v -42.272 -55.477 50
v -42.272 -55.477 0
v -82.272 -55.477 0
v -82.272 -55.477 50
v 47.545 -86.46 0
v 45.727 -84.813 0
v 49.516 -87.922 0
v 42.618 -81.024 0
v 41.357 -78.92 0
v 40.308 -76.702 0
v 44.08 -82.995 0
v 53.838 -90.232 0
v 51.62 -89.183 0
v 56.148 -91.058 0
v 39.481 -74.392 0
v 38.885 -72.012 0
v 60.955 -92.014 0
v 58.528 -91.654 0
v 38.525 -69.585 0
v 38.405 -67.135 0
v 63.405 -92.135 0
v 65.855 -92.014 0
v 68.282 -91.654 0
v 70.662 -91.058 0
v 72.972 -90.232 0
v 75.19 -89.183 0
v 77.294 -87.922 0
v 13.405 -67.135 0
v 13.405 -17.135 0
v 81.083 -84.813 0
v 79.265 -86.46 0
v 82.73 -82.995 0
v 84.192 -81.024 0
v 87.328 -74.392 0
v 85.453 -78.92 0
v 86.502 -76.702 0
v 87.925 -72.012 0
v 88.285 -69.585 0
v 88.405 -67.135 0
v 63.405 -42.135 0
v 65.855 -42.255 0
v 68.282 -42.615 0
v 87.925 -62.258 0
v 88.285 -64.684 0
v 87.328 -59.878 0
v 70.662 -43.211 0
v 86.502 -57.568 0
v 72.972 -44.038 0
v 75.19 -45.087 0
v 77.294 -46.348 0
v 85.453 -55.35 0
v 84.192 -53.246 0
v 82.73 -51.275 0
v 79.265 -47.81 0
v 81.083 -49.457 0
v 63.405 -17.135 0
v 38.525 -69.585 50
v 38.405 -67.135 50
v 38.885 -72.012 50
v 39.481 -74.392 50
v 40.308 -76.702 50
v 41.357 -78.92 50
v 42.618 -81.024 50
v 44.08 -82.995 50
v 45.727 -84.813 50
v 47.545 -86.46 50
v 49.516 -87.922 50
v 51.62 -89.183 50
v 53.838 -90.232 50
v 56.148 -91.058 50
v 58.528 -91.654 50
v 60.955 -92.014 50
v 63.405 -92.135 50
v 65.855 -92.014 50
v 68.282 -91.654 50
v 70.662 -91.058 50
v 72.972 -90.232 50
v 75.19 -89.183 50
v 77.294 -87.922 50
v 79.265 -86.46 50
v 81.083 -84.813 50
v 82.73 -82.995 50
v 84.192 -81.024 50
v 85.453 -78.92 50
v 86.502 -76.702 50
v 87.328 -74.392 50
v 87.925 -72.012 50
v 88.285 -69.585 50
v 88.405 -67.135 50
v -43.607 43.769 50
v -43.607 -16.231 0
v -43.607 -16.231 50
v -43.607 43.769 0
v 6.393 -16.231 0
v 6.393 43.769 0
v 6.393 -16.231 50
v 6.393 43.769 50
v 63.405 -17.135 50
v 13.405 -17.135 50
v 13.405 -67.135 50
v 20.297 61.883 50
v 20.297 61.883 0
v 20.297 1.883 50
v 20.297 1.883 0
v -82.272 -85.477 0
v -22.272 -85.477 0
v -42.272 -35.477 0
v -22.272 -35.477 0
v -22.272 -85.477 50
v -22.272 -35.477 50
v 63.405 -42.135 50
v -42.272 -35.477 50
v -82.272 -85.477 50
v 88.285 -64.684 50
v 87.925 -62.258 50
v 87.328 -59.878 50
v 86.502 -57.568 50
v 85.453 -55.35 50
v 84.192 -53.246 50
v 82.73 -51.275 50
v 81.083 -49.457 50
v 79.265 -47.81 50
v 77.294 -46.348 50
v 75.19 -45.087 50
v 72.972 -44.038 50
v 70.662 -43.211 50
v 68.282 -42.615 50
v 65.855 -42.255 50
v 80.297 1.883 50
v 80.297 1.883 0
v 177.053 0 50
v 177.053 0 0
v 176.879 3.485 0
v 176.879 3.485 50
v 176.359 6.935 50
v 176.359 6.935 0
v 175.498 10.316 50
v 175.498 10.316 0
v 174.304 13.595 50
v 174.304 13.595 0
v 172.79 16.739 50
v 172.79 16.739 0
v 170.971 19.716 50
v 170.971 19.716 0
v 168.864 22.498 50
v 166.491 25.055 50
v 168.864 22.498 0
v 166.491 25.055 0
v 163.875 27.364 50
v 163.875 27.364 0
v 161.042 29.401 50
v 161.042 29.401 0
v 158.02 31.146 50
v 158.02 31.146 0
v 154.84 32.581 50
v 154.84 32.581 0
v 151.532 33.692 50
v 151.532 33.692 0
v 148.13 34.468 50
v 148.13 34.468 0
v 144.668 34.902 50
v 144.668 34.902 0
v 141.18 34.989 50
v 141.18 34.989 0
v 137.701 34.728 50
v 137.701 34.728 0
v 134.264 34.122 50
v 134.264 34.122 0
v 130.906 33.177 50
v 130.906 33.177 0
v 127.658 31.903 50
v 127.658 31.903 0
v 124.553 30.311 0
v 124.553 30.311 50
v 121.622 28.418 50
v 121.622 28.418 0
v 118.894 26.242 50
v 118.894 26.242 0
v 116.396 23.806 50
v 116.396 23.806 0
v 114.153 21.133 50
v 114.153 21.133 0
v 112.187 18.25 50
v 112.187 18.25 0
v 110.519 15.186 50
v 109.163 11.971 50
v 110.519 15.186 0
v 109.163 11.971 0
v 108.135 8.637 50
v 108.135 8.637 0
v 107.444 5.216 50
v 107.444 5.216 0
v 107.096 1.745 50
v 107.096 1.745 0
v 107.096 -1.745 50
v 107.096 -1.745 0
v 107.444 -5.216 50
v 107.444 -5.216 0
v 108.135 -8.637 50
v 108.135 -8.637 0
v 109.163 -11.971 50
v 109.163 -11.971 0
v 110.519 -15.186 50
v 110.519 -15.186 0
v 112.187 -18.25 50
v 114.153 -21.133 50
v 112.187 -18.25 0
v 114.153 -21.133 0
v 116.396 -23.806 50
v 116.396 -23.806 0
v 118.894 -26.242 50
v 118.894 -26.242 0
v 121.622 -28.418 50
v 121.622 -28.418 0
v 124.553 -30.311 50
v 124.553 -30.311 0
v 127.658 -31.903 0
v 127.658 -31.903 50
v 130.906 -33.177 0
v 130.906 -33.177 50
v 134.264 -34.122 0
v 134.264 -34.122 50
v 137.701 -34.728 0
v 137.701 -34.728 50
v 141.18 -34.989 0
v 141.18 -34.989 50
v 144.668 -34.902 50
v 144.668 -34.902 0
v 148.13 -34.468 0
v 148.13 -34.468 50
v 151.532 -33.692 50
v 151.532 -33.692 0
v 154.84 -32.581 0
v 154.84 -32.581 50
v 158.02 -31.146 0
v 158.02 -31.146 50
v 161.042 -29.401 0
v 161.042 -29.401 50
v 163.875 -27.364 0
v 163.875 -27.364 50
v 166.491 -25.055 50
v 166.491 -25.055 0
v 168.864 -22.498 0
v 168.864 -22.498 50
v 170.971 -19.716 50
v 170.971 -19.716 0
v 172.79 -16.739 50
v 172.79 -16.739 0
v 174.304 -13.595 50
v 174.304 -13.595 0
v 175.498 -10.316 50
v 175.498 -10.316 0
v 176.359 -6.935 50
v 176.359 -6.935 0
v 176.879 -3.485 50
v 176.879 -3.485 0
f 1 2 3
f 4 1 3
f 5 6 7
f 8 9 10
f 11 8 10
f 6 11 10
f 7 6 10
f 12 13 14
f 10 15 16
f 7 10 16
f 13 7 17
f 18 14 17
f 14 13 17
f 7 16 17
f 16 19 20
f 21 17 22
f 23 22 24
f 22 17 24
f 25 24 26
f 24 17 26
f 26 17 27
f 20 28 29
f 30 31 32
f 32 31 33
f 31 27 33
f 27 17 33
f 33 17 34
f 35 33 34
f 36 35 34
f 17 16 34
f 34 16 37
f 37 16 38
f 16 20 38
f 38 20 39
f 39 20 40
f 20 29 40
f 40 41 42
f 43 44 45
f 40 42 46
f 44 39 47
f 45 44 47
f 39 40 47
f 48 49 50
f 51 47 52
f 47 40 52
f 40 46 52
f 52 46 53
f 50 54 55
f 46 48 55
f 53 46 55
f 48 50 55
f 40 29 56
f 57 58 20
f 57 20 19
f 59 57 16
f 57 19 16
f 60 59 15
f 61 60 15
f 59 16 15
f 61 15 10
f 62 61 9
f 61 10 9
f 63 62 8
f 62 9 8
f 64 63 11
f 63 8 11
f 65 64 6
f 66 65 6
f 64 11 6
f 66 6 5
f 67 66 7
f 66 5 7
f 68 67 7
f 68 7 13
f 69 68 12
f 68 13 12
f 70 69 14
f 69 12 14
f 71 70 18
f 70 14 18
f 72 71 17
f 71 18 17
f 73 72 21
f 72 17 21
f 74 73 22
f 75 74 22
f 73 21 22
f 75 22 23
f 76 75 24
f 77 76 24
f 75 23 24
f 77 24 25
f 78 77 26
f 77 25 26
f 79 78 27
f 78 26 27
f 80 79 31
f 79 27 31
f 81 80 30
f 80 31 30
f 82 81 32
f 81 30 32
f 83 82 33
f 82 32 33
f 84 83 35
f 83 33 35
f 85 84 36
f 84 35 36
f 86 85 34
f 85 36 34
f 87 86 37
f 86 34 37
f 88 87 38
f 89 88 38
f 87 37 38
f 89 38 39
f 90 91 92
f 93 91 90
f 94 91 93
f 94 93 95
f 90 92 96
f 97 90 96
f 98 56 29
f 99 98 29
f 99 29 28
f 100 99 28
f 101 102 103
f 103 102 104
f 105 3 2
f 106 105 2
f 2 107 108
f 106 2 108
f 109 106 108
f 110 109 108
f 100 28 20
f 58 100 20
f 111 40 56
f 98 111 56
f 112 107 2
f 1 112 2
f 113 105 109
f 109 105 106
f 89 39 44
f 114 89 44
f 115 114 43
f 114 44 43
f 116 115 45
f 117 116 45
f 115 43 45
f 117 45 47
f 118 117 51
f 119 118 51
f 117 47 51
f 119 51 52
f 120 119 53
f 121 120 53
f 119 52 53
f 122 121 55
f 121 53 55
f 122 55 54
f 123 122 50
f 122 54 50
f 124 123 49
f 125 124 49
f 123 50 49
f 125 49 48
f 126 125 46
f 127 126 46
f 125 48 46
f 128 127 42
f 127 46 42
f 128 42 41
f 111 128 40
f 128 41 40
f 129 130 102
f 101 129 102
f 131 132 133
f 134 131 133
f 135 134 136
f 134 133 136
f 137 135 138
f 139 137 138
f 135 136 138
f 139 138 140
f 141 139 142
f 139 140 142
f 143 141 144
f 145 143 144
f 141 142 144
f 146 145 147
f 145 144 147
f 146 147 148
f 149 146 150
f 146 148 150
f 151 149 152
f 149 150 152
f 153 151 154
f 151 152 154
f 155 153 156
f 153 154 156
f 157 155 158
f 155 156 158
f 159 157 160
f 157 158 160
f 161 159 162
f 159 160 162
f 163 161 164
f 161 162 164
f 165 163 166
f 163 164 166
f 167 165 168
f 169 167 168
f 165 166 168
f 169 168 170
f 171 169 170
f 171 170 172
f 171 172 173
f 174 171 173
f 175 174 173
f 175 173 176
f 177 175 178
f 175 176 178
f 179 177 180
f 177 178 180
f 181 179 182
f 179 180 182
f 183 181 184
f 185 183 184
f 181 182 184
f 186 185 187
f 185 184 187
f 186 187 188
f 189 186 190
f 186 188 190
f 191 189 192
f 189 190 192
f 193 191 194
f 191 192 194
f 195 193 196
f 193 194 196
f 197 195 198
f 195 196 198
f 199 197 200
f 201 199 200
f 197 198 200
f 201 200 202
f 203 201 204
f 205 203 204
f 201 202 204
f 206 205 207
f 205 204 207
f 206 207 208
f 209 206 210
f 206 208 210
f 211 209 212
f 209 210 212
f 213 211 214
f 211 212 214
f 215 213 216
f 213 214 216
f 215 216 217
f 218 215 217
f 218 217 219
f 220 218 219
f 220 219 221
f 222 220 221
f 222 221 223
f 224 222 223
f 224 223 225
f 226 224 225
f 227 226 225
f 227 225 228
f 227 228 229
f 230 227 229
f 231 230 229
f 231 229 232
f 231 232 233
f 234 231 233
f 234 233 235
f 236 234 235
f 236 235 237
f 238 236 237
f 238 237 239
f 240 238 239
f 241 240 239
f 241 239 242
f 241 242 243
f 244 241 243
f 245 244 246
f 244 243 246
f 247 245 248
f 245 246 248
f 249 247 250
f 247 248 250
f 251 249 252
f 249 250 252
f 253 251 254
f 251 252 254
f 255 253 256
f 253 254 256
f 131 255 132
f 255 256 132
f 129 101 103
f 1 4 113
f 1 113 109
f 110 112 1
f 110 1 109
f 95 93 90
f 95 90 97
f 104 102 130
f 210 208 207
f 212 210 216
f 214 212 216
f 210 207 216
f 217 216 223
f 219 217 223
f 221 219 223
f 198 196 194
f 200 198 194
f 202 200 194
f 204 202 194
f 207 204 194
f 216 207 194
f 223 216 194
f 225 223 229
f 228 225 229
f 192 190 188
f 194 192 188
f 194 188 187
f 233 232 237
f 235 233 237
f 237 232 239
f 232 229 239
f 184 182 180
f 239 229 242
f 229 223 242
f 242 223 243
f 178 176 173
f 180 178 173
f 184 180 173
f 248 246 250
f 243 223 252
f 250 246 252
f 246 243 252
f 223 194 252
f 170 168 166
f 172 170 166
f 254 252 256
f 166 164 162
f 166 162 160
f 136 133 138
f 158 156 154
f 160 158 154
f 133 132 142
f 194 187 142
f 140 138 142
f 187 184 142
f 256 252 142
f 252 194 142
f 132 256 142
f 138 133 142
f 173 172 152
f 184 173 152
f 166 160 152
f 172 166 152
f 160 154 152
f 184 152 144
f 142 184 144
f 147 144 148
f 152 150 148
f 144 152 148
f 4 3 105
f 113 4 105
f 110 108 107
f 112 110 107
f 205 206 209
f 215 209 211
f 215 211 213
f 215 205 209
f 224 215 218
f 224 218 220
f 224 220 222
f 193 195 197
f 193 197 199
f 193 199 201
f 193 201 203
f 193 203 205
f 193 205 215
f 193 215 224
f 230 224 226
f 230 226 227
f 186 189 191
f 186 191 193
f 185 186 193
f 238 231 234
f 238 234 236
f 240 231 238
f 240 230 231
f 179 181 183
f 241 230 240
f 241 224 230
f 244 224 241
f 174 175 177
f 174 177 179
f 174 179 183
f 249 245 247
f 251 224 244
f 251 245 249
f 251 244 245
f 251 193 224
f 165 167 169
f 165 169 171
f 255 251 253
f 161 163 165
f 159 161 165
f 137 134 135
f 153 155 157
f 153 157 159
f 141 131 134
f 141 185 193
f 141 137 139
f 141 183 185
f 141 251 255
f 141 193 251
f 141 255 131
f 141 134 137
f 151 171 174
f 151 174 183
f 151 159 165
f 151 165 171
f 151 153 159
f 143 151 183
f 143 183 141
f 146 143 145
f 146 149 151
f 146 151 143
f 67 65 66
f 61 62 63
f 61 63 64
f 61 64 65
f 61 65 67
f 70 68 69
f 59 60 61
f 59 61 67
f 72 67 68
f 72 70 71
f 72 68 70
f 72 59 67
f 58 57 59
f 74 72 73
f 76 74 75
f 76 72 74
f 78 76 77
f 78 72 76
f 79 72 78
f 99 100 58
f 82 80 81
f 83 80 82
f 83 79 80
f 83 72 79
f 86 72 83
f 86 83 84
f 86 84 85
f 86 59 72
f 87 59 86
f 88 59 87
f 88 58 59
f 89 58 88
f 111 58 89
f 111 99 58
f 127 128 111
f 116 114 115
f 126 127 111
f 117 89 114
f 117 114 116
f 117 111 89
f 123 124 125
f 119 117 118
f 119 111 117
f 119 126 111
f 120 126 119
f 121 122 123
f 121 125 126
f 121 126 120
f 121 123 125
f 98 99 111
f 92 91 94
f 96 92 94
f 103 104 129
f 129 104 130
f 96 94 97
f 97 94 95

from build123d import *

# Parameters (mm, degrees)
F0_W     = 50
F0_H     = 60
F1_DEPTH = 50
F3_DEPTH = 50
F5_DEPTH = 50
F6_R     = 35
F7_DEPTH = 50


with BuildPart() as f1:
    # F0 (on Top) → F1 (new body)
    with BuildSketch(Plane.XY):
        with Locations((-18.606977, 13.768542)):
            Rectangle(F0_W, F0_H)
    extrude(amount=F1_DEPTH)


with BuildPart() as f3:
    # F2 (on Top) → F3 (new body)
    with BuildSketch(Plane.XY):
        Polygon((-22.27184, -35.476992), (-42.27184, -35.476992), (-42.27184, -55.476992), (-82.27184, -55.476992), (-82.27184, -85.476992), (-22.27184, -85.476992), align=None)
    extrude(amount=F3_DEPTH)


with BuildPart() as f5:
    # F4 (on Top) → F5 (new body)
    with BuildSketch(Plane.XY):
        Polygon((20.296728, 61.883115), (20.296728, 1.883115), (80.296728, 1.883115), align=None)
    extrude(amount=F5_DEPTH)


with BuildPart() as f7:
    # F6 (on Top) → F7 (new body)
    with BuildSketch(Plane.XY):
        with BuildLine():
            ThreePointArc((88.404931, -67.134853), (81.082601, -49.457183), (63.404931, -42.134853))
            Line((63.404931, -42.134853), (63.404931, -67.134853))
            Line((63.404931, -67.134853), (38.404931, -67.134853))
            ThreePointArc((38.404931, -67.134853), (63.404931, -92.134853), (88.404931, -67.134853))
        make_face()
        with BuildLine():
            Line((63.404931, -67.134853), (63.404931, -42.134853))
            ThreePointArc((63.404931, -42.134853), (45.727262, -49.457183), (38.404931, -67.134853))
            Line((38.404931, -67.134853), (63.404931, -67.134853))
        make_face()
        with BuildLine():
            Line((63.404931, -17.134853), (13.404931, -17.134853))
            Line((13.404931, -17.134853), (13.404931, -67.134853))
            Line((13.404931, -67.134853), (38.404931, -67.134853))
            ThreePointArc((38.404931, -67.134853), (45.727262, -49.457183), (63.404931, -42.134853))
            Line((63.404931, -42.134853), (63.404931, -17.134853))
        make_face()
        with Locations((142.05268, 0)):
            Circle(F6_R)
    extrude(amount=F7_DEPTH)


solid = Compound([f1.part, f3.part, f5.part, f7.part])
